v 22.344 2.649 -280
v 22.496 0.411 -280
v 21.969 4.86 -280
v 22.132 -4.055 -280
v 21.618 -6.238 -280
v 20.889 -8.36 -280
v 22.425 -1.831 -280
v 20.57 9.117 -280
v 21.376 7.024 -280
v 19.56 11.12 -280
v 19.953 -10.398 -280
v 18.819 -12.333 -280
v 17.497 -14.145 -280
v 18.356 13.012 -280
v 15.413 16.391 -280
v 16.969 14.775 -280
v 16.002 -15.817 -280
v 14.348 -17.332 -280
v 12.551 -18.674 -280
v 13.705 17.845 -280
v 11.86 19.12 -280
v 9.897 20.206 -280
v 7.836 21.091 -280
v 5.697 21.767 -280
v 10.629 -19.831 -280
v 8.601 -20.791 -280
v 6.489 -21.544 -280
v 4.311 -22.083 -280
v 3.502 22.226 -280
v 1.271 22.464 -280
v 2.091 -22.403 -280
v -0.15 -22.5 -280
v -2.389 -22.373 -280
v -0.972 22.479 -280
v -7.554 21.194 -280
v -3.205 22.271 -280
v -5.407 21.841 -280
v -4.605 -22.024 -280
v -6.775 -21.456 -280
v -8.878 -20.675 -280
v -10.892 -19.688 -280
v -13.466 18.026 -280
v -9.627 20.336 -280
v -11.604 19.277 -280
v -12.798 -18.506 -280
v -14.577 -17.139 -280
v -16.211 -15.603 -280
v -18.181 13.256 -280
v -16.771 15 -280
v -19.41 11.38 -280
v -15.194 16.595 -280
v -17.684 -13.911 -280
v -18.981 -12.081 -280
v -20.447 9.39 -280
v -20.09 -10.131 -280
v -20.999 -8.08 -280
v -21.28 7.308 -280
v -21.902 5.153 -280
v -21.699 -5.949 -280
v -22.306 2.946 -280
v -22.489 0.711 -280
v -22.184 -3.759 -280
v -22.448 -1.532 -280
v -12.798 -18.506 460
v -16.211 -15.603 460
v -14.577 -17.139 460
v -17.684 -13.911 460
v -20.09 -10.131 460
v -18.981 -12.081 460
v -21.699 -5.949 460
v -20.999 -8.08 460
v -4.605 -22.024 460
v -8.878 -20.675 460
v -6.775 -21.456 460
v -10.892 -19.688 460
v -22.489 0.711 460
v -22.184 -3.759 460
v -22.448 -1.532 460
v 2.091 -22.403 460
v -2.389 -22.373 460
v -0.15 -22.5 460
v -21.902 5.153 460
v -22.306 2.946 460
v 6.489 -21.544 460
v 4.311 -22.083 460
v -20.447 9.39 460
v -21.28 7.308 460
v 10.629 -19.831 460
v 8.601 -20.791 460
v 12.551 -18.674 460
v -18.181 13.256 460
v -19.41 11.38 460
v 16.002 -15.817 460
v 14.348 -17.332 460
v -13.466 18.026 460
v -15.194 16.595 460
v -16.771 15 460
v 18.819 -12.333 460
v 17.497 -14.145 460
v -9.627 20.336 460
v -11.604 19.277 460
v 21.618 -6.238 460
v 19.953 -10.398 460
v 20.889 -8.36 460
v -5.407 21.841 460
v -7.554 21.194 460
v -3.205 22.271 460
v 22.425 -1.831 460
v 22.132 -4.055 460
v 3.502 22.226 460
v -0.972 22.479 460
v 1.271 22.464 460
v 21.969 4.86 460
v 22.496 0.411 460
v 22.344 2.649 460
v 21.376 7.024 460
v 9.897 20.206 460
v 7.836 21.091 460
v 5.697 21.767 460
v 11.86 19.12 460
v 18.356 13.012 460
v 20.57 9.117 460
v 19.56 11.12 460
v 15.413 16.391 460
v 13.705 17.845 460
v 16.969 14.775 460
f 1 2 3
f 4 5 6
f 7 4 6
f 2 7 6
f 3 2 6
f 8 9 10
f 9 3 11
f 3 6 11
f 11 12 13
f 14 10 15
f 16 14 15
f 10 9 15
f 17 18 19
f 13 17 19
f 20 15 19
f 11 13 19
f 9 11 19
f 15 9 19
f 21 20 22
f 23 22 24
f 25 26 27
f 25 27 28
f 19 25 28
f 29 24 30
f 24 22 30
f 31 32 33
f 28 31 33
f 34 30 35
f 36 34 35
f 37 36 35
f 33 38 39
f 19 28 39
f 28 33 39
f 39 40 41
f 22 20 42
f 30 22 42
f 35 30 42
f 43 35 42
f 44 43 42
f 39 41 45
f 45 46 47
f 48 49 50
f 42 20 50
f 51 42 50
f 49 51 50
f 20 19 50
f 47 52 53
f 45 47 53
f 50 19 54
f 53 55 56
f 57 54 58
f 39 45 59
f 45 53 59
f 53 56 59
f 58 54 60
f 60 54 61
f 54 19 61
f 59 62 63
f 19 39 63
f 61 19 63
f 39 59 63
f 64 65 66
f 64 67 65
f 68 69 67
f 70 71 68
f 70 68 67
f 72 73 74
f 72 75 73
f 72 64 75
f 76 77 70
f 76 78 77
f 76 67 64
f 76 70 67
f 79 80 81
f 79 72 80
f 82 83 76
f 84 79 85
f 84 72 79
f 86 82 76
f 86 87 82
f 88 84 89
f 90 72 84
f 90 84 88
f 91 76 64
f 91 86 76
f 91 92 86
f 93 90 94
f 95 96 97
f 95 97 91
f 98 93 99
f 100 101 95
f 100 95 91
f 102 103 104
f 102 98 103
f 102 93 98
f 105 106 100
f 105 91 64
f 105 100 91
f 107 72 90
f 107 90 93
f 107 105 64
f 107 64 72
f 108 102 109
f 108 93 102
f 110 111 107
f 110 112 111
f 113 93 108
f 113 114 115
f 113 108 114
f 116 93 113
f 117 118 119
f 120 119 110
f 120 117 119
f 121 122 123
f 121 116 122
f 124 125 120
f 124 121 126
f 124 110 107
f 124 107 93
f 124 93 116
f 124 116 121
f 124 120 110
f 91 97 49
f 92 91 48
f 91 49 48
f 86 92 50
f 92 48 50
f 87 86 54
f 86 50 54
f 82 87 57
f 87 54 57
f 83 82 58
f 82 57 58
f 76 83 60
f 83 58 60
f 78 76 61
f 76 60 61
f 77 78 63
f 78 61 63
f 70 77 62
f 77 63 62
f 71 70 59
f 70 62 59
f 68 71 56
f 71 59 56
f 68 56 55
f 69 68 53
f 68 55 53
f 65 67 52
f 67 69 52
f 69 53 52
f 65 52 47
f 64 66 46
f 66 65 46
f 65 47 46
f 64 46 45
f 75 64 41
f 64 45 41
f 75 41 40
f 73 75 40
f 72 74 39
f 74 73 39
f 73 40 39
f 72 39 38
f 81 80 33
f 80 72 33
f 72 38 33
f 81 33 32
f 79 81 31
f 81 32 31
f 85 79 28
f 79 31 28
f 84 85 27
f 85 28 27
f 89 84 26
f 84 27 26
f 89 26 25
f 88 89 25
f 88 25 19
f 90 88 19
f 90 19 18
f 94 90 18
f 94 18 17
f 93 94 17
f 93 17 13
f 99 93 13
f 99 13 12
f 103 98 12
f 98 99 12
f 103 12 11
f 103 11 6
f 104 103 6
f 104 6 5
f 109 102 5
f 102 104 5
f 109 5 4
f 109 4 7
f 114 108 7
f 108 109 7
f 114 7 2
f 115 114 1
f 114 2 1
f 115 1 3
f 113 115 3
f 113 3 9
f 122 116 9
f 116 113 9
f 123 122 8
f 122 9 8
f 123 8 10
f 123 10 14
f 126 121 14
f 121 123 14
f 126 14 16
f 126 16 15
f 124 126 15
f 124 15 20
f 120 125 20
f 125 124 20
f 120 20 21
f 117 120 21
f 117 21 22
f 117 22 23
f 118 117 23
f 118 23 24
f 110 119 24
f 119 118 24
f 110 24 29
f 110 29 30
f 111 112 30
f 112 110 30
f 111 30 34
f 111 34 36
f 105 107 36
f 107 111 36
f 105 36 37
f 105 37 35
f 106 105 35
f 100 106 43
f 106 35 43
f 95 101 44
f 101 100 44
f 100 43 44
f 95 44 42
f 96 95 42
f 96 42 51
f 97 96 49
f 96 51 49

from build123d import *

# Parameters (mm, degrees)
SKETCH_7_R           = 35
SKETCH_7_R_2         = 15
EXTRUDE_1_DEPTH      = 15
EXTRUDE_2_REACH      = 817.889
EXTRUDE_2_END_RADIUS = 35
SKETCH_5_R           = 22.5
SKETCH_8_W           = 185.294970715
SKETCH_8_H           = 135.350234673
CUT_EXTRUDE_1_DEPTH  = 25


with BuildPart() as part:
    # 草图7 → 凸台-拉伸1 (new, symmetric)
    with BuildSketch(Plane(origin=(0, 0, 0), x_dir=(1, 0, 0), z_dir=(0, 1, 0))):
        with Locations(Location((0, -500, 0), (0, 0, 270))):
            Circle(SKETCH_7_R)
        with Locations(Location((0, -500, 0), (0, 0, 270))):
            Circle(SKETCH_7_R_2, mode=Mode.SUBTRACT)
    extrude(amount=EXTRUDE_1_DEPTH, both=True)

    # 凸台-拉伸2: up to this cylinder (the profile starts outside it)
    extrude_2_end = Plane(origin=(0, 0, 500), z_dir=(0, -1, 0)) * Cylinder(EXTRUDE_2_END_RADIUS, 1706.778, mode=Mode.PRIVATE)
    # 草图5 → 凸台-拉伸2 (add, up to the surface)
    with BuildSketch(Plane.XY.offset(-280), mode=Mode.PRIVATE) as extrude_2_sk1:
        with Locations(Location((0, 0, 0), (0, 0, 138.189685104))):
            Circle(SKETCH_5_R)
    extrude_2_tool1 = extrude(extrude_2_sk1.sketch, amount=EXTRUDE_2_REACH, mode=Mode.PRIVATE) - extrude_2_end
    add(extrude_2_tool1.solids().sort_by_distance((0, 0, -280))[0])

    # 草图8 → 切除-拉伸1 (cut, symmetric)
    with BuildSketch(Plane(origin=(0, 0, 0), x_dir=(1, 0, 0), z_dir=(0, 1, 0))):
        with Locations((-2.493067274, -527.675117337)):
            Rectangle(SKETCH_8_W, SKETCH_8_H)
    extrude(amount=CUT_EXTRUDE_1_DEPTH, both=True, mode=Mode.SUBTRACT)


solid = part.part
